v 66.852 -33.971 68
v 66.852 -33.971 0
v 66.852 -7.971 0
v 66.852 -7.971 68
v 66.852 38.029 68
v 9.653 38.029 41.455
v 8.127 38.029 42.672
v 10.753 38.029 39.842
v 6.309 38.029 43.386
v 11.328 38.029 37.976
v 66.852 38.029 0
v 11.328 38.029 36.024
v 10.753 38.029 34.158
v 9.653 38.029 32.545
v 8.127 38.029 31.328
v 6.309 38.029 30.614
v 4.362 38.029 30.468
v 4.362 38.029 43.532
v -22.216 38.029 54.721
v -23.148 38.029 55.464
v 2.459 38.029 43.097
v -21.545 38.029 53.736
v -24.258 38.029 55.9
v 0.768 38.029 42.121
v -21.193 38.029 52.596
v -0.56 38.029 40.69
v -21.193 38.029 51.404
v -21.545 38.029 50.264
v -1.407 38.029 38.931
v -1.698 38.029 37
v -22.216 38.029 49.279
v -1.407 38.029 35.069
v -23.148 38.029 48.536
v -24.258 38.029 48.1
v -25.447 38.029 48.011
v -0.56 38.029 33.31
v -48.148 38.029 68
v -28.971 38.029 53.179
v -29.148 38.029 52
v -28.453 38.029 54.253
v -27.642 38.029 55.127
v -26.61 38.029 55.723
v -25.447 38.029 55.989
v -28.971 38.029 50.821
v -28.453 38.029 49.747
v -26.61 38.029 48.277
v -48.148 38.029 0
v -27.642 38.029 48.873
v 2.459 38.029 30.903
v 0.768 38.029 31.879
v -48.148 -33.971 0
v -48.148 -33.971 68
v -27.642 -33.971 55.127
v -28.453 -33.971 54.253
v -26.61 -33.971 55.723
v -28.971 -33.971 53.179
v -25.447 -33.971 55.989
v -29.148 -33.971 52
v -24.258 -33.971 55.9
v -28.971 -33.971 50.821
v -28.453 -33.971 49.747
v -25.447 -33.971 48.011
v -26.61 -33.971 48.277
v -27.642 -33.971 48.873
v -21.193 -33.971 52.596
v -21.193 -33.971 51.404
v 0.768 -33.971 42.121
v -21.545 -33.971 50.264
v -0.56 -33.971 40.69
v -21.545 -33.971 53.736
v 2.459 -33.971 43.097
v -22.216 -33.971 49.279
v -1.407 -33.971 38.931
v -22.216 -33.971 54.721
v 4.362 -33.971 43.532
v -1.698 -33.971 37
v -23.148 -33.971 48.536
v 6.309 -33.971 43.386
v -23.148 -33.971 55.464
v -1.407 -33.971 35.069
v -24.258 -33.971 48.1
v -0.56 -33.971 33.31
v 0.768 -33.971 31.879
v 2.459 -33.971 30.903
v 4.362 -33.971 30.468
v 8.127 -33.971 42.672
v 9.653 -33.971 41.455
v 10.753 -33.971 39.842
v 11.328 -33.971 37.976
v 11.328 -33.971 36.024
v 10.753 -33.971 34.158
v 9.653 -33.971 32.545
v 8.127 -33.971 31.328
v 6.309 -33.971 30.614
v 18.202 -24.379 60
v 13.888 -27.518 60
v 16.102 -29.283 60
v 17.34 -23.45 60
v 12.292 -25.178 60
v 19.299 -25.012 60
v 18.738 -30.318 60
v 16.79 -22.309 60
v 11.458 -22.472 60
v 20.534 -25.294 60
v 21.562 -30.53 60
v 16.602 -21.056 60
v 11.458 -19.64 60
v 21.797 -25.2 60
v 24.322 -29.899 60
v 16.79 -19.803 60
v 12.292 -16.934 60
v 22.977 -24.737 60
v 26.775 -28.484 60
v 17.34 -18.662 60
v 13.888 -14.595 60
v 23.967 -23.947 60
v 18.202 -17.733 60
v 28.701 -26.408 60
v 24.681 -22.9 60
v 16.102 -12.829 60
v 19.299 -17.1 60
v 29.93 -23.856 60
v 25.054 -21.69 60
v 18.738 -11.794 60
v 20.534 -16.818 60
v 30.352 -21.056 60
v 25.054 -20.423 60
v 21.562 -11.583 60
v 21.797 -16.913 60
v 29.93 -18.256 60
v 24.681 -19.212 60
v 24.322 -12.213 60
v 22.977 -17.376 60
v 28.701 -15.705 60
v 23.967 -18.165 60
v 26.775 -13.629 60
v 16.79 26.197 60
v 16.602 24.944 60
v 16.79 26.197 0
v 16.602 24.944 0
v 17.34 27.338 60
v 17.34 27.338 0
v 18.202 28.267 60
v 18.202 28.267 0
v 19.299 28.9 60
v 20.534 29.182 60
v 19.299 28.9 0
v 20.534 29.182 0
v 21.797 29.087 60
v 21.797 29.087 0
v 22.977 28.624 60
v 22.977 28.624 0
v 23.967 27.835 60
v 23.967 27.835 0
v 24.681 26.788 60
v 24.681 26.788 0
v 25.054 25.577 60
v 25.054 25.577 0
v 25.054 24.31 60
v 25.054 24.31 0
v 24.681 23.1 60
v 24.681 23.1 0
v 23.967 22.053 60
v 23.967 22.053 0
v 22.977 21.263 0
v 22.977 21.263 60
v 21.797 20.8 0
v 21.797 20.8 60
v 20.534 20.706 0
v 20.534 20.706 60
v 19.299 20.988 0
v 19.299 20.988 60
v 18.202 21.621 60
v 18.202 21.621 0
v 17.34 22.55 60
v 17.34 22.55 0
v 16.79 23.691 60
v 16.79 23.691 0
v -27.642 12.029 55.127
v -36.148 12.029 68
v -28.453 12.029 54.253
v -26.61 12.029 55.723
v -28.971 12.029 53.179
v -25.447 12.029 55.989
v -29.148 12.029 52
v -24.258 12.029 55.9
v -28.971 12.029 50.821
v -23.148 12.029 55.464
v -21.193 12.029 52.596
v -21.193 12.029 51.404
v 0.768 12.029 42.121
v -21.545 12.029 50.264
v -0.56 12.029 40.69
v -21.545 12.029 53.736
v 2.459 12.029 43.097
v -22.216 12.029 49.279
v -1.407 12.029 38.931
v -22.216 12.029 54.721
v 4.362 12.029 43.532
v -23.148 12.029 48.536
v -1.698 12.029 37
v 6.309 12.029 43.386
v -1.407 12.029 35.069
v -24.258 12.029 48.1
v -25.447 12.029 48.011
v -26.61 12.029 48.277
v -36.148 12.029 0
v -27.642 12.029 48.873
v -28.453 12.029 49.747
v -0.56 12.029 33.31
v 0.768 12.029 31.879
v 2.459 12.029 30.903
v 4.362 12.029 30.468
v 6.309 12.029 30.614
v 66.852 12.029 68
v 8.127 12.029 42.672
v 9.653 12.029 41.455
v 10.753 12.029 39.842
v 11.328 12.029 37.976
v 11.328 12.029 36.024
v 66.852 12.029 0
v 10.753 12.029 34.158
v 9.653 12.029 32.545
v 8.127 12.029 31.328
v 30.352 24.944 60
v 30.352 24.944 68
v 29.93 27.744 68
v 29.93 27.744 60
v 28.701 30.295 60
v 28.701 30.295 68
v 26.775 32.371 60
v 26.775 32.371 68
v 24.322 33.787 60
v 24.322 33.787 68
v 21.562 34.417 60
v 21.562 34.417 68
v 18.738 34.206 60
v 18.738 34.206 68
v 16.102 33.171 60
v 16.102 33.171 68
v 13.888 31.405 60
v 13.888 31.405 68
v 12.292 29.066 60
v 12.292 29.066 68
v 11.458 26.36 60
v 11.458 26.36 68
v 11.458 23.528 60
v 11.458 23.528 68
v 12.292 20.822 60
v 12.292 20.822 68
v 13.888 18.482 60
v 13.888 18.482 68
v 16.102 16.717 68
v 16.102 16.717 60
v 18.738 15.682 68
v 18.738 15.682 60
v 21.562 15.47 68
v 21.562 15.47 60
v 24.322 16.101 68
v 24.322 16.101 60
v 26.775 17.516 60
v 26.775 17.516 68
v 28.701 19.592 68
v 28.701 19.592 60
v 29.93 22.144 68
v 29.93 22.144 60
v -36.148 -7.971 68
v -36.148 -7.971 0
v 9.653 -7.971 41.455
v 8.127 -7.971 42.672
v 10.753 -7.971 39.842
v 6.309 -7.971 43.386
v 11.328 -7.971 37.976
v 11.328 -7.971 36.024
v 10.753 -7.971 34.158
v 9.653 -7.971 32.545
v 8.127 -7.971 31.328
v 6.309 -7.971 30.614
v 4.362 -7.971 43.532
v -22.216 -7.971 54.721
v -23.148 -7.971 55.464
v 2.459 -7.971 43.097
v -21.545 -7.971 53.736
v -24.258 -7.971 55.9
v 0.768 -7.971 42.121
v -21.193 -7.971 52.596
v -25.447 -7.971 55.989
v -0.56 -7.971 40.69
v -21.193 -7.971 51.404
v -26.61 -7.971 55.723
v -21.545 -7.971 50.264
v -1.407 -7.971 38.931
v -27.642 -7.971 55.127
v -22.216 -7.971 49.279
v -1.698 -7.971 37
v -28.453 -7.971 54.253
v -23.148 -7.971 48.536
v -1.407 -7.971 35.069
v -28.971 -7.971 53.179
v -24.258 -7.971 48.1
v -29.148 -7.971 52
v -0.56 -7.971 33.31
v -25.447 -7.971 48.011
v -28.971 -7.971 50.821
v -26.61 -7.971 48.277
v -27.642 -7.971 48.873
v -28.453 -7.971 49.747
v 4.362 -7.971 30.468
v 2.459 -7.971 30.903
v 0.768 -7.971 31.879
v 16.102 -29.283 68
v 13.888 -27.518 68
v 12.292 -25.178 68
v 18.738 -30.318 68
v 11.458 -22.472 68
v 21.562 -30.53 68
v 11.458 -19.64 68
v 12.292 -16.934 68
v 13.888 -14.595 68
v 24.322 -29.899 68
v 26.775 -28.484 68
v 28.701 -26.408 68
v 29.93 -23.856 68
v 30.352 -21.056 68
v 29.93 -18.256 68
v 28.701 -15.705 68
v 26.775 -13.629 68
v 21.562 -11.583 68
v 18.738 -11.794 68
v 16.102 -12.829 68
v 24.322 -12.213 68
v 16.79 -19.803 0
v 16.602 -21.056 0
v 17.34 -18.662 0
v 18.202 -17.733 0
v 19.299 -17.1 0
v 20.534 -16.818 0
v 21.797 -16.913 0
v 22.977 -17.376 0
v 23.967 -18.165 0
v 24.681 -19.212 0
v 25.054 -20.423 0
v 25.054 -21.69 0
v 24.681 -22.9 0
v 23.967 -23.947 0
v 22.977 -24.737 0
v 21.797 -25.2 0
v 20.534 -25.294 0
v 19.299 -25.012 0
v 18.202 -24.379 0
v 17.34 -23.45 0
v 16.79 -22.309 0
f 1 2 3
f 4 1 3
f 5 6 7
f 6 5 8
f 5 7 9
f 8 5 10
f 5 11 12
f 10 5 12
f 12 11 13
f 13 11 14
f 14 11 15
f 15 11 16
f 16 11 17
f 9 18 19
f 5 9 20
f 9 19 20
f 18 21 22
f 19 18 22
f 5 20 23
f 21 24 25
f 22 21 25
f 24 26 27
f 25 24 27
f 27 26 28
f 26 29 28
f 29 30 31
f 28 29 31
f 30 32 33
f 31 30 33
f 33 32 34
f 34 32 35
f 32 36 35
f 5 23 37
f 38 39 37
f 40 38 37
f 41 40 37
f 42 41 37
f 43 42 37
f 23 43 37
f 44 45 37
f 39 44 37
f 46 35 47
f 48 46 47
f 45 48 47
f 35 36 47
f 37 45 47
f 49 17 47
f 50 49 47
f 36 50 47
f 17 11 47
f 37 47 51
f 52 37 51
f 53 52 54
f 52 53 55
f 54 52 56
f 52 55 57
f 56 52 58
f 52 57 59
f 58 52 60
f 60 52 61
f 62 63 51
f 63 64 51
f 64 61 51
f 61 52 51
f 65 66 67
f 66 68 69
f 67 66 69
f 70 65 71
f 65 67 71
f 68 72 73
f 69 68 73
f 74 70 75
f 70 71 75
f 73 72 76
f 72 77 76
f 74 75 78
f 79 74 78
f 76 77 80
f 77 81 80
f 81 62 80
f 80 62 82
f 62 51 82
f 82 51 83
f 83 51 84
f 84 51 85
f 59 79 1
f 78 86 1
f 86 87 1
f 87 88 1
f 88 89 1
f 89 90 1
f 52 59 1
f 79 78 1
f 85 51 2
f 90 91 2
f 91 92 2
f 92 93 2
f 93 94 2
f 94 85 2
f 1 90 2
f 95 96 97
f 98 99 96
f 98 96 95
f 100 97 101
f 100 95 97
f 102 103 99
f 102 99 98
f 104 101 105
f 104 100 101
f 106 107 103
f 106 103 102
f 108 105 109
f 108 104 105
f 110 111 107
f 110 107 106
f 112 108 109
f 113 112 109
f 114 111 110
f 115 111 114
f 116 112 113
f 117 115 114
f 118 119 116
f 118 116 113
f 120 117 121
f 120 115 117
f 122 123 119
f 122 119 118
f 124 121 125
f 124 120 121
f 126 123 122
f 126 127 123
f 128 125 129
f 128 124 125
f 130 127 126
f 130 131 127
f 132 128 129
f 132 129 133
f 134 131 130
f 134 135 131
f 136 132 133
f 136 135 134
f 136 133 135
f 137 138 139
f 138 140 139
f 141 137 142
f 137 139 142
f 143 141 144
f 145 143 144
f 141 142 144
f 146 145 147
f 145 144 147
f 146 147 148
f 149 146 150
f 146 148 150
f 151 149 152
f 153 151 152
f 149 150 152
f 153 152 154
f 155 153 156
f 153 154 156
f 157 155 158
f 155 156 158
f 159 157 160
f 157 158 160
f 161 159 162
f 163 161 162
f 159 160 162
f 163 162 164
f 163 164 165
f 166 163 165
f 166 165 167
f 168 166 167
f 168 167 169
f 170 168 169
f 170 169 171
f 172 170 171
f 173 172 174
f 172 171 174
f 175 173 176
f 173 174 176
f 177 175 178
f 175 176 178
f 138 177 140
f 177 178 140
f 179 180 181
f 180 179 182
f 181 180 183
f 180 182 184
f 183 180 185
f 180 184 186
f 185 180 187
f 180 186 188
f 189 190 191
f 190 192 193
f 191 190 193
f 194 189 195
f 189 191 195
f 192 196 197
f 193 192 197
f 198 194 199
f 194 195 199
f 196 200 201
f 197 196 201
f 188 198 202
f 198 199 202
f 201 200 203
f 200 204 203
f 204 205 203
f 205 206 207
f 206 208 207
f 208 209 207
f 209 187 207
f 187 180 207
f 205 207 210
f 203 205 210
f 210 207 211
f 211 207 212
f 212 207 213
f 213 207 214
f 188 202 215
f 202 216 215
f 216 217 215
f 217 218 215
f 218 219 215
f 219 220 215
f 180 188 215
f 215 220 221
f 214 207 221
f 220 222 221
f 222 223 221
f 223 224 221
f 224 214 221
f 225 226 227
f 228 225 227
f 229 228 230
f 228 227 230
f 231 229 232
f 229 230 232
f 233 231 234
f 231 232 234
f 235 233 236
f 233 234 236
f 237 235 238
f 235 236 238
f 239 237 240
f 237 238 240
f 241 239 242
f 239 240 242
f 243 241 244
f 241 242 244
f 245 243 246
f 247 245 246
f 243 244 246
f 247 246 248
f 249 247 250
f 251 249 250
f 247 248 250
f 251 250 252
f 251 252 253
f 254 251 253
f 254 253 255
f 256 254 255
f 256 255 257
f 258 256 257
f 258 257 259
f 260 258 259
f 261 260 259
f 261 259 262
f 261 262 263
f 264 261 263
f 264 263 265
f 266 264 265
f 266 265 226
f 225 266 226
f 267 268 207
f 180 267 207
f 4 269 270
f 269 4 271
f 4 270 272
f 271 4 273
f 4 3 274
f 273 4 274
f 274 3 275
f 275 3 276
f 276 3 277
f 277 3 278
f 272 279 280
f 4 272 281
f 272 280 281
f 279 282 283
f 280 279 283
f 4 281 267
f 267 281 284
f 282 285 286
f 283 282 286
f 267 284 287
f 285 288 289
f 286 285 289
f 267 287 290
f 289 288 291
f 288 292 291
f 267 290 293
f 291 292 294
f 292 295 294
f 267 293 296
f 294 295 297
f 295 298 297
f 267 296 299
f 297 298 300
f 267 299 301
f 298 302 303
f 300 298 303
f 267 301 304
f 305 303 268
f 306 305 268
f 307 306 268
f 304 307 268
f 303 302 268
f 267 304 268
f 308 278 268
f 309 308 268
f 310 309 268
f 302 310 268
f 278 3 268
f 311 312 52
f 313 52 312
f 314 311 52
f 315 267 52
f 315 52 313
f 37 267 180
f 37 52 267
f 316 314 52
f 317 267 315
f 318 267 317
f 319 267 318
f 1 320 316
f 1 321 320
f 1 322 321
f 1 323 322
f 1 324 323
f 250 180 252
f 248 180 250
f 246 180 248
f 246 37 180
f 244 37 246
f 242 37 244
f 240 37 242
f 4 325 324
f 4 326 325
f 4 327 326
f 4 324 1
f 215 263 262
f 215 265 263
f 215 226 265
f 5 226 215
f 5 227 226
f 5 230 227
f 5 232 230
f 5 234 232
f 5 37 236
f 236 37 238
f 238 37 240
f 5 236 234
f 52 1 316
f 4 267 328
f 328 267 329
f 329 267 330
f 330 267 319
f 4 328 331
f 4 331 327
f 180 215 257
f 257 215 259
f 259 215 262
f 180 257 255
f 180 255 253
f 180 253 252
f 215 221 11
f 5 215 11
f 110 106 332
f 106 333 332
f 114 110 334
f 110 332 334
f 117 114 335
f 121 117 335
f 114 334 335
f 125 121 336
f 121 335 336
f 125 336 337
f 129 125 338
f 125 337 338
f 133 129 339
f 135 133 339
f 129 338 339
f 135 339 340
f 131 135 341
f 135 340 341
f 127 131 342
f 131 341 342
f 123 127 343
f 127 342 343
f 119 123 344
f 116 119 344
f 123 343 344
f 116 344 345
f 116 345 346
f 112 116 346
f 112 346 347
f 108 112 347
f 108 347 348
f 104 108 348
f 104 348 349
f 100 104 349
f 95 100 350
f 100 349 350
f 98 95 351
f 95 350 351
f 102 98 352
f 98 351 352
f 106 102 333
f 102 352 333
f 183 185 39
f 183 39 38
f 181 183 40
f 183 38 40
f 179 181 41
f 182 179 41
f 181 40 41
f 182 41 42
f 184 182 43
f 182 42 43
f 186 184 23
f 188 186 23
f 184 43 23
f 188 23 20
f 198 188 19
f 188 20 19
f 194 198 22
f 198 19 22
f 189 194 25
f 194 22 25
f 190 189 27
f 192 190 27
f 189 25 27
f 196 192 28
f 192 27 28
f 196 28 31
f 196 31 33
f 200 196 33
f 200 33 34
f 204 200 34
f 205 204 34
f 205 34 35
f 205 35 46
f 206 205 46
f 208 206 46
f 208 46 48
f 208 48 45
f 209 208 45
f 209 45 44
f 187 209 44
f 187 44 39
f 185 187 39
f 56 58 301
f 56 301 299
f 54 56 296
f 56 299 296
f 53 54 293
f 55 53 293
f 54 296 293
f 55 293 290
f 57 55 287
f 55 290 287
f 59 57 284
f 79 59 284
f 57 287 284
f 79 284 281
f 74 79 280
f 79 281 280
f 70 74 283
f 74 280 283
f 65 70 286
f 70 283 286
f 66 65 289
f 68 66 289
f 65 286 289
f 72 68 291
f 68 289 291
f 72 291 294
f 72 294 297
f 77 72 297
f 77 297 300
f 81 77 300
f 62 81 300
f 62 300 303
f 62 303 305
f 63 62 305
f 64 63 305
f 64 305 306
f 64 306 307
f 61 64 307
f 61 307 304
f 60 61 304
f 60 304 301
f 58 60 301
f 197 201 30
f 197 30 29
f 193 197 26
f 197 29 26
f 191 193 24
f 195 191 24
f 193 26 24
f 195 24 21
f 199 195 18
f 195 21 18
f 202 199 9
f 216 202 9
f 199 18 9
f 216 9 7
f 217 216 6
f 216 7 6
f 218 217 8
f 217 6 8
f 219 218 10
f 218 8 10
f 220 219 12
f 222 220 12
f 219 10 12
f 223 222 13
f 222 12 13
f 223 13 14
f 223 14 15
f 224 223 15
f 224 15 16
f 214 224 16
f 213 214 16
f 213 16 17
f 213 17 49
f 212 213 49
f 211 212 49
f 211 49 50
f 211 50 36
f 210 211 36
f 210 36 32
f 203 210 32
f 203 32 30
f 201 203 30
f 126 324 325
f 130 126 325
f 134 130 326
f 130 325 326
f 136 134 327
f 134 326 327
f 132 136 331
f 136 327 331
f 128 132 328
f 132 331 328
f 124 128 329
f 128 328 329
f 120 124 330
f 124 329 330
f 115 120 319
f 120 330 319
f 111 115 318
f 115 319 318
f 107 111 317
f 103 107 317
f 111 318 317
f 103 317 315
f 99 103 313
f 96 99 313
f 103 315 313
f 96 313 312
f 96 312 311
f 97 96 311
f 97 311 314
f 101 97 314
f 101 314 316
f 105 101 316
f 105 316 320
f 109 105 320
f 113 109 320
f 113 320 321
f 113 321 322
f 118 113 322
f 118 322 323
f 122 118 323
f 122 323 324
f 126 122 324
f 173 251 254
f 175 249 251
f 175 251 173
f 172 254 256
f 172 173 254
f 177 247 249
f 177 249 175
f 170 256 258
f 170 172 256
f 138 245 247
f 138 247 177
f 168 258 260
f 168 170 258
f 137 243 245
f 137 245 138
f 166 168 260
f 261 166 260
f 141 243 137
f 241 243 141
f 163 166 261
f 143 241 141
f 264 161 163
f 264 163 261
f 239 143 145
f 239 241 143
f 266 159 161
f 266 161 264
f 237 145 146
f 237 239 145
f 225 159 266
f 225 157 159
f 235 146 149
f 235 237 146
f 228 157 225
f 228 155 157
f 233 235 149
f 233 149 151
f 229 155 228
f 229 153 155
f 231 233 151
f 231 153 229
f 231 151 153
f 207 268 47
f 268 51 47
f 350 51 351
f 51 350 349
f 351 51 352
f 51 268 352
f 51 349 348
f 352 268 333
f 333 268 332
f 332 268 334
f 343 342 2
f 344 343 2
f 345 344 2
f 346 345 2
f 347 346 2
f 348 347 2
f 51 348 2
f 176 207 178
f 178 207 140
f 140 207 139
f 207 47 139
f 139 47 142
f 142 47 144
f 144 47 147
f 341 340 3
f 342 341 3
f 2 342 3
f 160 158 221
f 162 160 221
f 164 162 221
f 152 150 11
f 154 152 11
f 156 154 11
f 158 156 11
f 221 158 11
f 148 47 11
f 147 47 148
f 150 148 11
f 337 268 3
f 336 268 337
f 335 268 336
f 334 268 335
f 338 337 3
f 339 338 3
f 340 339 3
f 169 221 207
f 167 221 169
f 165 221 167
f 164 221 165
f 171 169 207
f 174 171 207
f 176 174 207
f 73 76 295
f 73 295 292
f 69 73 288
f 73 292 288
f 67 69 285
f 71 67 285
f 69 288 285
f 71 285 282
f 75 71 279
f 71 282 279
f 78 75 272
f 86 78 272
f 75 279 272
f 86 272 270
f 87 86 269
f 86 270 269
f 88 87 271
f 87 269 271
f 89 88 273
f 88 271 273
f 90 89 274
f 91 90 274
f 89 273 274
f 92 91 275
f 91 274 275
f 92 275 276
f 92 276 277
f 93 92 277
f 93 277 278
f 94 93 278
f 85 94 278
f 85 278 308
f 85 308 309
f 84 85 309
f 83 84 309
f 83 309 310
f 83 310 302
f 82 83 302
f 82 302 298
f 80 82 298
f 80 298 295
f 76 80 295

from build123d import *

# Parameters (mm, degrees)
F1_DEPTH       = 68
F3_D           = 8.5
F3_CBORE_D     = 19
F3_CBORE_DEPTH = 8
F5_D           = 13.1
F7_D           = 8


with BuildPart() as f1:
    # F0 (on Top) → F1 (new body)
    with BuildSketch(Plane.XY):
        Polygon((66.851603, 12.029409), (66.851603, 38.029409), (-48.148397, 38.029409), (-48.148397, -33.970591), (66.851603, -33.970591), (66.851603, -7.970591), (-36.148397, -7.970591), (-36.148397, 12.029409), align=None)
    extrude(amount=F1_DEPTH)

    # F3 (through all)
    with Locations(Plane.XY.offset(68)):
        with Locations((20.851603, 24.943848), (20.851603, -21.056152)):
            CounterBoreHole(F3_D / 2, F3_CBORE_D / 2, F3_CBORE_DEPTH)

    # F5 (through all)
    with Locations(Plane.XZ.offset(33.970591)):
        with Locations((4.851603, 37)):
            Hole(F5_D / 2)

    # F7 (through all)
    with Locations(Plane.XZ.offset(33.970591)):
        with Locations((-25.148397, 52)):
            Hole(F7_D / 2)


solid = f1.part
